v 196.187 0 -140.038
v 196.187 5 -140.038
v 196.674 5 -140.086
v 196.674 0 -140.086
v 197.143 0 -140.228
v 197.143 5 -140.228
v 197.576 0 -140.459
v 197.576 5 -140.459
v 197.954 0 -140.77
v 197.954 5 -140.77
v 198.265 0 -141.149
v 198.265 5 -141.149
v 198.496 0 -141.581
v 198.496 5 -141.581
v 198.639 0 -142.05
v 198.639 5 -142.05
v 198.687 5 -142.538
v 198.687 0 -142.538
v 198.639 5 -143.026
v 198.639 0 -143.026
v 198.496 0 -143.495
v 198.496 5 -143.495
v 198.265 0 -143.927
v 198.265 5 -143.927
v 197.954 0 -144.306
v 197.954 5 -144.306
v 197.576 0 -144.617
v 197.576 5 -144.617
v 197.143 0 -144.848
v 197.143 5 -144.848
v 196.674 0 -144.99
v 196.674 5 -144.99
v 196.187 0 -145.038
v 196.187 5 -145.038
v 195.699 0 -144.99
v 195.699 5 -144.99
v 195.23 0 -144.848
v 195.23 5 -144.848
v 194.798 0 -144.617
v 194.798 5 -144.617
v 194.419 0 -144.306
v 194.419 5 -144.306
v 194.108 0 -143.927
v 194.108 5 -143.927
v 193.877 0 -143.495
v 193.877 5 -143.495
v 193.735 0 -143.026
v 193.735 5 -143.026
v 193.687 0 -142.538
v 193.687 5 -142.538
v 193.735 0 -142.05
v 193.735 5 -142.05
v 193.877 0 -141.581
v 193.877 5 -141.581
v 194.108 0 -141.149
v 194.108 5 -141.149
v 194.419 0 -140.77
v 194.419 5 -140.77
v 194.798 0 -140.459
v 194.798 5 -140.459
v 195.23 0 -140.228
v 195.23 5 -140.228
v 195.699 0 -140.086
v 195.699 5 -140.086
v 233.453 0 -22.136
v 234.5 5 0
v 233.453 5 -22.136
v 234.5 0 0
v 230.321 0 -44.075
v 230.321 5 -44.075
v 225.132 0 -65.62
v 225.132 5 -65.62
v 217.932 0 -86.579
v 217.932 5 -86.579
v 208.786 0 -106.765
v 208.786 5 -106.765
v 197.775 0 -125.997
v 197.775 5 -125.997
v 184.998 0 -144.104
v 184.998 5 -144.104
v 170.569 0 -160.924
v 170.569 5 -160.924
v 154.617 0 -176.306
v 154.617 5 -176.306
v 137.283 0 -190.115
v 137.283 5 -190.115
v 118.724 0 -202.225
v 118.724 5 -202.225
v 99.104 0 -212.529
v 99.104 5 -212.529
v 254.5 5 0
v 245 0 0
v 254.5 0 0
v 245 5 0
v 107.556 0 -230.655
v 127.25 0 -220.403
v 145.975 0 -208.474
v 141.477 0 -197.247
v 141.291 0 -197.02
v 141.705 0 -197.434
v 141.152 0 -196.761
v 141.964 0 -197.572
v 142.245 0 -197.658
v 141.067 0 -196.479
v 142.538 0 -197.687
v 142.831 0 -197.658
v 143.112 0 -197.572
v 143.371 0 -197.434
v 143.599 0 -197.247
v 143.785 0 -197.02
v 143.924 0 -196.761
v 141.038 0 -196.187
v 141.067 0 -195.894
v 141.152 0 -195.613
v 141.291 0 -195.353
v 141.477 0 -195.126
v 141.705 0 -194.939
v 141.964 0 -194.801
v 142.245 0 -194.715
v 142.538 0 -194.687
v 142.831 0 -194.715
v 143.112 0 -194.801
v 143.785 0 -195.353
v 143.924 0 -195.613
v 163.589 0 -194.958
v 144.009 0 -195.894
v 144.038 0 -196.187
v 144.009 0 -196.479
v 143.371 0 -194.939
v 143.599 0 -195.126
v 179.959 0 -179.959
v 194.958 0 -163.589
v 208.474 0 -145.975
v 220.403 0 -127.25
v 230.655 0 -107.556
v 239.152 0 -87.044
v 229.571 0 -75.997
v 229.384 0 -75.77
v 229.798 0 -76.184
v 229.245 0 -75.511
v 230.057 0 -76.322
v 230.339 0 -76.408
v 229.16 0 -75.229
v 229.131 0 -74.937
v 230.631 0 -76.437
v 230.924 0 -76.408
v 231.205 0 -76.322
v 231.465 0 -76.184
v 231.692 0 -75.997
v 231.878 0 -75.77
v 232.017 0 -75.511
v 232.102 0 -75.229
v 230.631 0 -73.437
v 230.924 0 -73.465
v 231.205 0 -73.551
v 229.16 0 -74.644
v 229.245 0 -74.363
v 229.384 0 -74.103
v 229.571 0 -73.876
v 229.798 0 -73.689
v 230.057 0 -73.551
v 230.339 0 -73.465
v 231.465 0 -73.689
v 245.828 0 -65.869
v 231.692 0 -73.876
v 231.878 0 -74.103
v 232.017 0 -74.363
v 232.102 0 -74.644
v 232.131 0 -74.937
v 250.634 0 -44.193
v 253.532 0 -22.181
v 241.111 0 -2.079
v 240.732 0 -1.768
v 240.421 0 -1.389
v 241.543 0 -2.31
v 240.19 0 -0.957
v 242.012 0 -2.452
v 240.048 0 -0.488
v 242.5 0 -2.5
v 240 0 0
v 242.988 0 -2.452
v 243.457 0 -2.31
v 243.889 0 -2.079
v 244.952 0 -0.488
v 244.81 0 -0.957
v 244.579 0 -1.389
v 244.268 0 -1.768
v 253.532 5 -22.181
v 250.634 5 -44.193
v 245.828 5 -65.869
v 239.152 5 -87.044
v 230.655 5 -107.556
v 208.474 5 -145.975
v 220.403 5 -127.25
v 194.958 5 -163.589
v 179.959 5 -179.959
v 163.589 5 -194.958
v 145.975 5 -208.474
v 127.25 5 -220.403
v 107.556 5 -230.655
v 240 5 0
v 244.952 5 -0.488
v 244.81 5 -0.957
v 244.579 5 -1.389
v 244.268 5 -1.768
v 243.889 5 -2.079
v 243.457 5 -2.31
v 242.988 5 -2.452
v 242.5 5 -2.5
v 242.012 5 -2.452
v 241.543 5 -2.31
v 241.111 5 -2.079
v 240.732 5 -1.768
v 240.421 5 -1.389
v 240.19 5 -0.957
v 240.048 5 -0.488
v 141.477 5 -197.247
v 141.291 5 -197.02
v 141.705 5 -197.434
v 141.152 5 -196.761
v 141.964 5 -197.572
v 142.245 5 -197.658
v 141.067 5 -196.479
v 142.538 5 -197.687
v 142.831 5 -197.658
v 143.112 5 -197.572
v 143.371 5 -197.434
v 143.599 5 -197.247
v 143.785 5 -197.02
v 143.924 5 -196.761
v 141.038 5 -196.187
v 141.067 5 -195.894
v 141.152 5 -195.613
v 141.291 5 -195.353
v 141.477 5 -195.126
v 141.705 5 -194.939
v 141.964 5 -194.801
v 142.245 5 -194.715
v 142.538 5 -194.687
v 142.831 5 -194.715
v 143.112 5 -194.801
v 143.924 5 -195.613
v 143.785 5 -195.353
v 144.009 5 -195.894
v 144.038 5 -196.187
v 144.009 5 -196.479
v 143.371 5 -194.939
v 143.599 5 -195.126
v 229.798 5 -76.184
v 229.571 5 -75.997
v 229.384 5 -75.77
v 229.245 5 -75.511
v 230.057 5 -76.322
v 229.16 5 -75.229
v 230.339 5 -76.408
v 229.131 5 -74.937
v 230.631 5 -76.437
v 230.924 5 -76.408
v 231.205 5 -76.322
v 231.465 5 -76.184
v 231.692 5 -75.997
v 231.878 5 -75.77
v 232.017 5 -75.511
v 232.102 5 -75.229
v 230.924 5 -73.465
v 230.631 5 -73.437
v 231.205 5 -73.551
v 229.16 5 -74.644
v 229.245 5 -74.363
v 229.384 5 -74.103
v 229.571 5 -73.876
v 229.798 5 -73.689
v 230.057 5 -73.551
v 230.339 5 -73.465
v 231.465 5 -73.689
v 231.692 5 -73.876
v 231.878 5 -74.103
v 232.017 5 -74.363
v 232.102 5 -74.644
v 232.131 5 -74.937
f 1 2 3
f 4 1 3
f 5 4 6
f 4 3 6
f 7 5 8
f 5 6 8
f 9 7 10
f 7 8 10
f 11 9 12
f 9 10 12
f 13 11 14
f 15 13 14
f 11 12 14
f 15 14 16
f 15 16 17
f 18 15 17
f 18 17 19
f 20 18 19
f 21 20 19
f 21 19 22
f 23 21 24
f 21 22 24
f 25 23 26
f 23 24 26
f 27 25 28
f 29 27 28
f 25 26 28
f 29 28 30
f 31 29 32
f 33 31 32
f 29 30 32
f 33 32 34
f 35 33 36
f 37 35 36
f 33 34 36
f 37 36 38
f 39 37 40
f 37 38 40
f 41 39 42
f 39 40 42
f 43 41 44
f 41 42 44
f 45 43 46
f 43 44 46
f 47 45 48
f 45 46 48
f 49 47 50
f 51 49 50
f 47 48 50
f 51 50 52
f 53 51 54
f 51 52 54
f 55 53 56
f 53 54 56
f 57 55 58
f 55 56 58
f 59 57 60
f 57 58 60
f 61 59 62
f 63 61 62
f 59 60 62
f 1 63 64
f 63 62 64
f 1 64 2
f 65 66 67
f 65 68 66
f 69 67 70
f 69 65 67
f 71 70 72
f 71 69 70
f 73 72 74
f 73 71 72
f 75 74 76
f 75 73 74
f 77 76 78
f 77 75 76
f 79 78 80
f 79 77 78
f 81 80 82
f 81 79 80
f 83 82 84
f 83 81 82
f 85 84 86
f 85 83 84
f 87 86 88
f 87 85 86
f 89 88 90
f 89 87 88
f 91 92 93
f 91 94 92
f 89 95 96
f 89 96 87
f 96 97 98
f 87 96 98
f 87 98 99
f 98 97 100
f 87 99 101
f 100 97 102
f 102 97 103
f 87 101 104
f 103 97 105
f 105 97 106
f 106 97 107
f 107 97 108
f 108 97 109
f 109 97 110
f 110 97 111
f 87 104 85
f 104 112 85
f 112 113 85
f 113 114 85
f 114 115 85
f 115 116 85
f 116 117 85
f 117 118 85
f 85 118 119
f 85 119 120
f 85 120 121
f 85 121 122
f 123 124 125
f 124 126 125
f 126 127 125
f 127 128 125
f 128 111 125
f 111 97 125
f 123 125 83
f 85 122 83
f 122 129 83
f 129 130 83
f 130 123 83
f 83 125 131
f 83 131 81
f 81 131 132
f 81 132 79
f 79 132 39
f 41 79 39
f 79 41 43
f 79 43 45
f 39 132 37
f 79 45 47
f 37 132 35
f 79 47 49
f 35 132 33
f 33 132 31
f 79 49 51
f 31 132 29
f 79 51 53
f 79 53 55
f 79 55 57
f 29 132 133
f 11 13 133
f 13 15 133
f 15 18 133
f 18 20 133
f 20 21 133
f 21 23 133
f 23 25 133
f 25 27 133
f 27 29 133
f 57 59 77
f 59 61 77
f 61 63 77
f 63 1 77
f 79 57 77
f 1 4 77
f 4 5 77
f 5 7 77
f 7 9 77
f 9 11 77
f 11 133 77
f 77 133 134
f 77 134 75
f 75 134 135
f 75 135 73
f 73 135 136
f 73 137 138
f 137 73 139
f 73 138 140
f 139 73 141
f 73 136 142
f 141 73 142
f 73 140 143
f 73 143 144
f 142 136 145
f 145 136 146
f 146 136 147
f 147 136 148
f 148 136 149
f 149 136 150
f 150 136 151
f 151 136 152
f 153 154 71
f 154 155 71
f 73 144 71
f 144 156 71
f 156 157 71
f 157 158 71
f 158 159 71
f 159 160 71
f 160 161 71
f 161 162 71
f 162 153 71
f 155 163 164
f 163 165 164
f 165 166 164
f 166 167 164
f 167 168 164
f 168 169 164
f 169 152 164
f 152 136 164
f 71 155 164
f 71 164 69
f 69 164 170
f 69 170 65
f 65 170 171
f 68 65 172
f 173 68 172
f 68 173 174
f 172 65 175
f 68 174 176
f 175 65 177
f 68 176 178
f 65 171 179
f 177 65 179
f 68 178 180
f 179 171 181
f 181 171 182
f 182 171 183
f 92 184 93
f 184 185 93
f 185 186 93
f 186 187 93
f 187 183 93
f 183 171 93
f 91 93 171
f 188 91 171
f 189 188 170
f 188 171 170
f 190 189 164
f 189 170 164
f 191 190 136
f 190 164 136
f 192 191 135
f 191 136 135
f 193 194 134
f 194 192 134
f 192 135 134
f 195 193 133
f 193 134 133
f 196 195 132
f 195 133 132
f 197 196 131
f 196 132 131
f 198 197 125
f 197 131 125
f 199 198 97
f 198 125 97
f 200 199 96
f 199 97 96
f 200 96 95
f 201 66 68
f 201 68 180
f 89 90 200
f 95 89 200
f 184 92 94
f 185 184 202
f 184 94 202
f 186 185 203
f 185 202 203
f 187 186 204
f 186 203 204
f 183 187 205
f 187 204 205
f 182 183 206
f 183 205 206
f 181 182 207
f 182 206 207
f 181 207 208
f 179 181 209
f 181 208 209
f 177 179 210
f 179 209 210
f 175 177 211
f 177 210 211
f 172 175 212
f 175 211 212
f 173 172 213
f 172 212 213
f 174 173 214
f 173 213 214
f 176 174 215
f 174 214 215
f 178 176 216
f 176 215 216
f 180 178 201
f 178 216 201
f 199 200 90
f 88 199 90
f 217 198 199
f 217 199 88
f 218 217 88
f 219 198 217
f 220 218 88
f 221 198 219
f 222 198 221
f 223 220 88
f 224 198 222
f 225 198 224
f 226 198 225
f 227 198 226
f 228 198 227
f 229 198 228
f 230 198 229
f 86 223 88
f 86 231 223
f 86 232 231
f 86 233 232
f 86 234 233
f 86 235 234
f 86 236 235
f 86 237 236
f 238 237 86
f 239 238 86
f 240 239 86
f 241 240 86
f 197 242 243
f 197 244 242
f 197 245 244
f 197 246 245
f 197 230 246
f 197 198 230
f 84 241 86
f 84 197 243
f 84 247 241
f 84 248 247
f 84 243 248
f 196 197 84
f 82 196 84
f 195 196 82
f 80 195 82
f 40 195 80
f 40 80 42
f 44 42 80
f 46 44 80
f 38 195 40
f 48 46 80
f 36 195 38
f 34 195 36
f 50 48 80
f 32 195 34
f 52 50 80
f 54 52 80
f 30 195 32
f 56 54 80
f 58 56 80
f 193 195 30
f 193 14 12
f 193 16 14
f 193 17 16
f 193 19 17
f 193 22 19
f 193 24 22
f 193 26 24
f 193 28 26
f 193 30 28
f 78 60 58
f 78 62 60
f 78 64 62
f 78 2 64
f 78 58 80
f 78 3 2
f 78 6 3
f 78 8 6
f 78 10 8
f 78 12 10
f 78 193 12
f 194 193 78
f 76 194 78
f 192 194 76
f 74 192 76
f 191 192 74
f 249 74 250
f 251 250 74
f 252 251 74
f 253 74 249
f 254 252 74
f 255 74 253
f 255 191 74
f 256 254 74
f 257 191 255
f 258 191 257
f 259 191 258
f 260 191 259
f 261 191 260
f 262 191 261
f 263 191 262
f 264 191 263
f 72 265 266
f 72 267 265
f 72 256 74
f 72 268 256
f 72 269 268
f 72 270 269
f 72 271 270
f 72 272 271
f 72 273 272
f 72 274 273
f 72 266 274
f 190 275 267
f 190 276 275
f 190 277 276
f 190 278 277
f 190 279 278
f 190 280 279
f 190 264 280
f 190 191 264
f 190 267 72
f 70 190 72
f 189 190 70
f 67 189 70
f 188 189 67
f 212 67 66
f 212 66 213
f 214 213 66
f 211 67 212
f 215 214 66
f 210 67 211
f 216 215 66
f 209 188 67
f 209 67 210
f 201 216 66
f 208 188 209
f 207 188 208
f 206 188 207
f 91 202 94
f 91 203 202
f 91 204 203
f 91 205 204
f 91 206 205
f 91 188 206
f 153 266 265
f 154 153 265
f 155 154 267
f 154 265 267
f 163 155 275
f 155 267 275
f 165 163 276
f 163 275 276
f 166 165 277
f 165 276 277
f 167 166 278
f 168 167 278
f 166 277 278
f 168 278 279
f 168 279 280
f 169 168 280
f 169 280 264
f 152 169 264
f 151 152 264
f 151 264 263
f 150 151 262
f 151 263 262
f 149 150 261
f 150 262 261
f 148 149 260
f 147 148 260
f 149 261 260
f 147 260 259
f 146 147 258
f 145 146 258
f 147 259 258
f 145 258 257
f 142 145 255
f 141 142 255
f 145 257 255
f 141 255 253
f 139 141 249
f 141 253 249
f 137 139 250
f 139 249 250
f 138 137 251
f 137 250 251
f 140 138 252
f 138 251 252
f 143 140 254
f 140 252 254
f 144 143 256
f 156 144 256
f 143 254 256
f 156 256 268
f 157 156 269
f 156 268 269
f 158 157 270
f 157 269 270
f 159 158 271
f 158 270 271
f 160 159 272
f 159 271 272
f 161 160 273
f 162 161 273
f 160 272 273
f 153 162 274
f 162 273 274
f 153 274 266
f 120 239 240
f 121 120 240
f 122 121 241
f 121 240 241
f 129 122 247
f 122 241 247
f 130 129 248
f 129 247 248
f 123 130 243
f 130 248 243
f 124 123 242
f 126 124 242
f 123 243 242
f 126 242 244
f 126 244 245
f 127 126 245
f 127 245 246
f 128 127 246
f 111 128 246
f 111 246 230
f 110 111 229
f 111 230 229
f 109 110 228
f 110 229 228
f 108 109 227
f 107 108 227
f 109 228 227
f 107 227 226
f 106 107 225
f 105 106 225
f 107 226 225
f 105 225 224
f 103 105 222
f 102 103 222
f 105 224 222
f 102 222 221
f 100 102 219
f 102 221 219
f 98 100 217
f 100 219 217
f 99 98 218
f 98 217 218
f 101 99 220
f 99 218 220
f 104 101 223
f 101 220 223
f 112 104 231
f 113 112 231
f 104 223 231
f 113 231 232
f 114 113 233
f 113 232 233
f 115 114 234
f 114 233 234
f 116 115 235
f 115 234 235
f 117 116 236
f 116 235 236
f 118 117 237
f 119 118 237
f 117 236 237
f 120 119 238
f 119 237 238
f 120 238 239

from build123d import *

# Parameters (mm, degrees)
SKETCH1_R           = 254.5
SKETCH1_R_2         = 234.5
BOSS_EXTRUDE1_DEPTH = 5
SKETCH2_W           = 27.805822748
SKETCH2_H           = 60
CUT_EXTRUDE1_DEPTH  = 5
SKETCH3_R           = 2.5
CUT_EXTRUDE2_DEPTH  = 5
SKETCH4_R           = 1.5
CUT_EXTRUDE3_DEPTH  = 5
SKETCH5_W           = 651.212620435
SKETCH5_H           = 357.226439325
CUT_EXTRUDE4_DEPTH  = 10
CUT_EXTRUDE9_START  = -10
SKETCH6_R           = 1.5
SKETCH6_R_2         = 2.5
CUT_EXTRUDE9_DEPTH  = 10
SKETCH7_R           = 2.5
SKETCH7_R_2         = 1.5
CUT_EXTRUDE11_DEPTH = 10


with BuildPart() as part:
    # Sketch1 → Boss-Extrude1 (new body)
    with BuildSketch(Plane(origin=(0, 0, 0), x_dir=(1, 0, 0), z_dir=(0, 1, 0))):
        with Locations(Location((0, 0, 0), (0, 0, 270))):
            Circle(SKETCH1_R)
        with Locations(Location((0, 0, 0), (0, 0, 270))):
            Circle(SKETCH1_R_2, mode=Mode.SUBTRACT)
    extrude(amount=BOSS_EXTRUDE1_DEPTH)

    # Sketch2 → Cut-Extrude1 (cut)
    with BuildSketch(Plane(origin=(0, 5, 0), x_dir=(1, 0, 0), z_dir=(0, 1, 0))):
        with Locations((-240.597088626, 30)):
            Rectangle(SKETCH2_W, SKETCH2_H)
    cut_extrude1 = extrude(amount=-CUT_EXTRUDE1_DEPTH, mode=Mode.SUBTRACT)

    # Mirror1: Cut-Extrude1 across plane
    add(cut_extrude1.mirror(Plane.XY), mode=Mode.SUBTRACT)

    # Sketch3 → Cut-Extrude2 (cut)
    with BuildSketch(Plane(origin=(0, 5, 0), x_dir=(1, 0, 0), z_dir=(0, 1, 0))):
        with Locations(Location((242.5, 0, 0), (0, 0, 270))):
            Circle(SKETCH3_R)
        with Locations(Location((196.186621136, -142.537923681, 0), (0, 0, 270))):
            Circle(SKETCH3_R)
        with Locations(Location((74.936621136, -230.631205202, 0), (0, 0, 270))):
            Circle(SKETCH3_R)
        with Locations(Location((-74.936621136, -230.631205202, 0), (0, 0, 270))):
            Circle(SKETCH3_R)
        with Locations(Location((-196.186621136, -142.537923681, 0), (0, 0, 270))):
            Circle(SKETCH3_R)
        with Locations((-242.5, 0)):
            Circle(SKETCH3_R)
        with Locations(Location((-196.186621136, 142.537923681, 0), (0, 0, 270))):
            Circle(SKETCH3_R)
        with Locations(Location((-74.936621136, 230.631205202, 0), (0, 0, 270))):
            Circle(SKETCH3_R)
        with Locations(Location((74.936621136, 230.631205202, 0), (0, 0, 270))):
            Circle(SKETCH3_R)
        with Locations(Location((196.186621136, 142.537923681, 0), (0, 0, 270))):
            Circle(SKETCH3_R)
    extrude(amount=-CUT_EXTRUDE2_DEPTH, mode=Mode.SUBTRACT)

    # Sketch4 → Cut-Extrude3 (cut)
    with BuildSketch(Plane(origin=(0, 5, 0), x_dir=(1, 0, 0), z_dir=(0, 1, 0))):
        with Locations(Location((0, -242.5, 0), (0, 0, 270))):
            Circle(SKETCH4_R)
        with Locations(Location((-142.537923681, -196.186621136, 0), (0, 0, 270))):
            Circle(SKETCH4_R)
        with Locations(Location((-230.631205202, -74.936621136, 0), (0, 0, 270))):
            Circle(SKETCH4_R)
        with Locations(Location((-230.631205202, 74.936621136, 0), (0, 0, 270))):
            Circle(SKETCH4_R)
        with Locations(Location((-142.537923681, 196.186621136, 0), (0, 0, 270))):
            Circle(SKETCH4_R)
        with Locations(Location((0, 242.5, 0), (0, 0, 270))):
            Circle(SKETCH4_R)
        with Locations(Location((142.537923681, 196.186621136, 0), (0, 0, 270))):
            Circle(SKETCH4_R)
        with Locations(Location((230.631205202, 74.936621136, 0), (0, 0, 270))):
            Circle(SKETCH4_R)
        with Locations(Location((230.631205202, -74.936621136, 0), (0, 0, 270))):
            Circle(SKETCH4_R)
        with Locations(Location((142.537923681, -196.186621136, 0), (0, 0, 270))):
            Circle(SKETCH4_R)
    extrude(amount=-CUT_EXTRUDE3_DEPTH, mode=Mode.SUBTRACT)

    # Sketch5 → Cut-Extrude4 (cut)
    with BuildSketch(Plane(origin=(0, 5, 0), x_dir=(1, 0, 0), z_dir=(0, 1, 0))):
        with Locations((-71.106310217, -178.613219663)):
            Rectangle(SKETCH5_W, SKETCH5_H)
    extrude(amount=-CUT_EXTRUDE4_DEPTH, mode=Mode.SUBTRACT)

    # Sketch6 → Cut-Extrude9 (cut)
    # profile 1 of 2: a face of its own
    with BuildSketch(Plane(origin=(0, 5, 0), x_dir=(1, 0, 0), z_dir=(0, 1, 0)).offset(CUT_EXTRUDE9_START)):
        with BuildLine():
            Line((-117.25, 203.082957187), (-127.25, 220.403465263))
            ThreePointArc((-127.25, 220.403465263), (-203.737945948, 152.51589878), (-247.326201604, 60))
            Line((-247.326201604, 60), (-226.694177252, 60))
            ThreePointArc((-226.694177252, 60), (-186.259449225, 142.469883043), (-117.25, 203.082957187))
        make_face()
        with Locations((-230.631205202, 74.936621136)):
            Circle(SKETCH6_R, mode=Mode.SUBTRACT)
        with Locations((-196.186621136, 142.537923681)):
            Circle(SKETCH6_R_2, mode=Mode.SUBTRACT)
        with Locations((-142.537923681, 196.186621136)):
            Circle(SKETCH6_R, mode=Mode.SUBTRACT)
    # profile 2 of 2: a face of its own
    with BuildSketch(Plane(origin=(0, 5, 0), x_dir=(1, 0, 0), z_dir=(0, 1, 0)).offset(CUT_EXTRUDE9_START)):
        with BuildLine():
            Line((-254.5, 0), (0, 0))
            Line((0, 0), (-117.25, 203.082957187))
            ThreePointArc((-117.25, 203.082957187), (-186.259449225, 142.469883043), (-226.694177252, 60))
            Line((-226.694177252, 60), (-247.326201604, 60))
            ThreePointArc((-247.326201604, 60), (-252.700186296, 30.213669851), (-254.5, 0))
        make_face()
    extrude(amount=CUT_EXTRUDE9_DEPTH, mode=Mode.SUBTRACT)

    # Sketch7 → Cut-Extrude11 (cut)
    # profile 1 of 2: a face of its own
    with BuildSketch(Plane(origin=(0, 5, 0), x_dir=(1, 0, 0), z_dir=(0, 1, 0))):
        with BuildLine():
            Line((99.103982378, 212.52917606), (107.556347613, 230.655331801))
            ThreePointArc((107.556347613, 230.655331801), (-11.101134084, 254.257772393), (-127.25, 220.403465263))
            Line((-127.25, 220.403465263), (-117.25, 203.082957187))
            ThreePointArc((-117.25, 203.082957187), (-10.228746337, 234.276807961), (99.103982378, 212.52917606))
        make_face()
        with Locations((-74.936621136, 230.631205202)):
            Circle(SKETCH7_R, mode=Mode.SUBTRACT)
        with Locations((0, 242.5)):
            Circle(SKETCH7_R_2, mode=Mode.SUBTRACT)
        with Locations((74.936621136, 230.631205202)):
            Circle(SKETCH7_R, mode=Mode.SUBTRACT)
    # profile 2 of 2: a face of its own
    with BuildSketch(Plane(origin=(0, 5, 0), x_dir=(1, 0, 0), z_dir=(0, 1, 0))):
        with BuildLine():
            Line((-117.25, 203.082957187), (0, 0))
            Line((0, 0), (99.103982378, 212.52917606))
            ThreePointArc((99.103982378, 212.52917606), (-10.228746337, 234.276807961), (-117.25, 203.082957187))
        make_face()
    extrude(amount=-CUT_EXTRUDE11_DEPTH, mode=Mode.SUBTRACT)


solid = part.part
